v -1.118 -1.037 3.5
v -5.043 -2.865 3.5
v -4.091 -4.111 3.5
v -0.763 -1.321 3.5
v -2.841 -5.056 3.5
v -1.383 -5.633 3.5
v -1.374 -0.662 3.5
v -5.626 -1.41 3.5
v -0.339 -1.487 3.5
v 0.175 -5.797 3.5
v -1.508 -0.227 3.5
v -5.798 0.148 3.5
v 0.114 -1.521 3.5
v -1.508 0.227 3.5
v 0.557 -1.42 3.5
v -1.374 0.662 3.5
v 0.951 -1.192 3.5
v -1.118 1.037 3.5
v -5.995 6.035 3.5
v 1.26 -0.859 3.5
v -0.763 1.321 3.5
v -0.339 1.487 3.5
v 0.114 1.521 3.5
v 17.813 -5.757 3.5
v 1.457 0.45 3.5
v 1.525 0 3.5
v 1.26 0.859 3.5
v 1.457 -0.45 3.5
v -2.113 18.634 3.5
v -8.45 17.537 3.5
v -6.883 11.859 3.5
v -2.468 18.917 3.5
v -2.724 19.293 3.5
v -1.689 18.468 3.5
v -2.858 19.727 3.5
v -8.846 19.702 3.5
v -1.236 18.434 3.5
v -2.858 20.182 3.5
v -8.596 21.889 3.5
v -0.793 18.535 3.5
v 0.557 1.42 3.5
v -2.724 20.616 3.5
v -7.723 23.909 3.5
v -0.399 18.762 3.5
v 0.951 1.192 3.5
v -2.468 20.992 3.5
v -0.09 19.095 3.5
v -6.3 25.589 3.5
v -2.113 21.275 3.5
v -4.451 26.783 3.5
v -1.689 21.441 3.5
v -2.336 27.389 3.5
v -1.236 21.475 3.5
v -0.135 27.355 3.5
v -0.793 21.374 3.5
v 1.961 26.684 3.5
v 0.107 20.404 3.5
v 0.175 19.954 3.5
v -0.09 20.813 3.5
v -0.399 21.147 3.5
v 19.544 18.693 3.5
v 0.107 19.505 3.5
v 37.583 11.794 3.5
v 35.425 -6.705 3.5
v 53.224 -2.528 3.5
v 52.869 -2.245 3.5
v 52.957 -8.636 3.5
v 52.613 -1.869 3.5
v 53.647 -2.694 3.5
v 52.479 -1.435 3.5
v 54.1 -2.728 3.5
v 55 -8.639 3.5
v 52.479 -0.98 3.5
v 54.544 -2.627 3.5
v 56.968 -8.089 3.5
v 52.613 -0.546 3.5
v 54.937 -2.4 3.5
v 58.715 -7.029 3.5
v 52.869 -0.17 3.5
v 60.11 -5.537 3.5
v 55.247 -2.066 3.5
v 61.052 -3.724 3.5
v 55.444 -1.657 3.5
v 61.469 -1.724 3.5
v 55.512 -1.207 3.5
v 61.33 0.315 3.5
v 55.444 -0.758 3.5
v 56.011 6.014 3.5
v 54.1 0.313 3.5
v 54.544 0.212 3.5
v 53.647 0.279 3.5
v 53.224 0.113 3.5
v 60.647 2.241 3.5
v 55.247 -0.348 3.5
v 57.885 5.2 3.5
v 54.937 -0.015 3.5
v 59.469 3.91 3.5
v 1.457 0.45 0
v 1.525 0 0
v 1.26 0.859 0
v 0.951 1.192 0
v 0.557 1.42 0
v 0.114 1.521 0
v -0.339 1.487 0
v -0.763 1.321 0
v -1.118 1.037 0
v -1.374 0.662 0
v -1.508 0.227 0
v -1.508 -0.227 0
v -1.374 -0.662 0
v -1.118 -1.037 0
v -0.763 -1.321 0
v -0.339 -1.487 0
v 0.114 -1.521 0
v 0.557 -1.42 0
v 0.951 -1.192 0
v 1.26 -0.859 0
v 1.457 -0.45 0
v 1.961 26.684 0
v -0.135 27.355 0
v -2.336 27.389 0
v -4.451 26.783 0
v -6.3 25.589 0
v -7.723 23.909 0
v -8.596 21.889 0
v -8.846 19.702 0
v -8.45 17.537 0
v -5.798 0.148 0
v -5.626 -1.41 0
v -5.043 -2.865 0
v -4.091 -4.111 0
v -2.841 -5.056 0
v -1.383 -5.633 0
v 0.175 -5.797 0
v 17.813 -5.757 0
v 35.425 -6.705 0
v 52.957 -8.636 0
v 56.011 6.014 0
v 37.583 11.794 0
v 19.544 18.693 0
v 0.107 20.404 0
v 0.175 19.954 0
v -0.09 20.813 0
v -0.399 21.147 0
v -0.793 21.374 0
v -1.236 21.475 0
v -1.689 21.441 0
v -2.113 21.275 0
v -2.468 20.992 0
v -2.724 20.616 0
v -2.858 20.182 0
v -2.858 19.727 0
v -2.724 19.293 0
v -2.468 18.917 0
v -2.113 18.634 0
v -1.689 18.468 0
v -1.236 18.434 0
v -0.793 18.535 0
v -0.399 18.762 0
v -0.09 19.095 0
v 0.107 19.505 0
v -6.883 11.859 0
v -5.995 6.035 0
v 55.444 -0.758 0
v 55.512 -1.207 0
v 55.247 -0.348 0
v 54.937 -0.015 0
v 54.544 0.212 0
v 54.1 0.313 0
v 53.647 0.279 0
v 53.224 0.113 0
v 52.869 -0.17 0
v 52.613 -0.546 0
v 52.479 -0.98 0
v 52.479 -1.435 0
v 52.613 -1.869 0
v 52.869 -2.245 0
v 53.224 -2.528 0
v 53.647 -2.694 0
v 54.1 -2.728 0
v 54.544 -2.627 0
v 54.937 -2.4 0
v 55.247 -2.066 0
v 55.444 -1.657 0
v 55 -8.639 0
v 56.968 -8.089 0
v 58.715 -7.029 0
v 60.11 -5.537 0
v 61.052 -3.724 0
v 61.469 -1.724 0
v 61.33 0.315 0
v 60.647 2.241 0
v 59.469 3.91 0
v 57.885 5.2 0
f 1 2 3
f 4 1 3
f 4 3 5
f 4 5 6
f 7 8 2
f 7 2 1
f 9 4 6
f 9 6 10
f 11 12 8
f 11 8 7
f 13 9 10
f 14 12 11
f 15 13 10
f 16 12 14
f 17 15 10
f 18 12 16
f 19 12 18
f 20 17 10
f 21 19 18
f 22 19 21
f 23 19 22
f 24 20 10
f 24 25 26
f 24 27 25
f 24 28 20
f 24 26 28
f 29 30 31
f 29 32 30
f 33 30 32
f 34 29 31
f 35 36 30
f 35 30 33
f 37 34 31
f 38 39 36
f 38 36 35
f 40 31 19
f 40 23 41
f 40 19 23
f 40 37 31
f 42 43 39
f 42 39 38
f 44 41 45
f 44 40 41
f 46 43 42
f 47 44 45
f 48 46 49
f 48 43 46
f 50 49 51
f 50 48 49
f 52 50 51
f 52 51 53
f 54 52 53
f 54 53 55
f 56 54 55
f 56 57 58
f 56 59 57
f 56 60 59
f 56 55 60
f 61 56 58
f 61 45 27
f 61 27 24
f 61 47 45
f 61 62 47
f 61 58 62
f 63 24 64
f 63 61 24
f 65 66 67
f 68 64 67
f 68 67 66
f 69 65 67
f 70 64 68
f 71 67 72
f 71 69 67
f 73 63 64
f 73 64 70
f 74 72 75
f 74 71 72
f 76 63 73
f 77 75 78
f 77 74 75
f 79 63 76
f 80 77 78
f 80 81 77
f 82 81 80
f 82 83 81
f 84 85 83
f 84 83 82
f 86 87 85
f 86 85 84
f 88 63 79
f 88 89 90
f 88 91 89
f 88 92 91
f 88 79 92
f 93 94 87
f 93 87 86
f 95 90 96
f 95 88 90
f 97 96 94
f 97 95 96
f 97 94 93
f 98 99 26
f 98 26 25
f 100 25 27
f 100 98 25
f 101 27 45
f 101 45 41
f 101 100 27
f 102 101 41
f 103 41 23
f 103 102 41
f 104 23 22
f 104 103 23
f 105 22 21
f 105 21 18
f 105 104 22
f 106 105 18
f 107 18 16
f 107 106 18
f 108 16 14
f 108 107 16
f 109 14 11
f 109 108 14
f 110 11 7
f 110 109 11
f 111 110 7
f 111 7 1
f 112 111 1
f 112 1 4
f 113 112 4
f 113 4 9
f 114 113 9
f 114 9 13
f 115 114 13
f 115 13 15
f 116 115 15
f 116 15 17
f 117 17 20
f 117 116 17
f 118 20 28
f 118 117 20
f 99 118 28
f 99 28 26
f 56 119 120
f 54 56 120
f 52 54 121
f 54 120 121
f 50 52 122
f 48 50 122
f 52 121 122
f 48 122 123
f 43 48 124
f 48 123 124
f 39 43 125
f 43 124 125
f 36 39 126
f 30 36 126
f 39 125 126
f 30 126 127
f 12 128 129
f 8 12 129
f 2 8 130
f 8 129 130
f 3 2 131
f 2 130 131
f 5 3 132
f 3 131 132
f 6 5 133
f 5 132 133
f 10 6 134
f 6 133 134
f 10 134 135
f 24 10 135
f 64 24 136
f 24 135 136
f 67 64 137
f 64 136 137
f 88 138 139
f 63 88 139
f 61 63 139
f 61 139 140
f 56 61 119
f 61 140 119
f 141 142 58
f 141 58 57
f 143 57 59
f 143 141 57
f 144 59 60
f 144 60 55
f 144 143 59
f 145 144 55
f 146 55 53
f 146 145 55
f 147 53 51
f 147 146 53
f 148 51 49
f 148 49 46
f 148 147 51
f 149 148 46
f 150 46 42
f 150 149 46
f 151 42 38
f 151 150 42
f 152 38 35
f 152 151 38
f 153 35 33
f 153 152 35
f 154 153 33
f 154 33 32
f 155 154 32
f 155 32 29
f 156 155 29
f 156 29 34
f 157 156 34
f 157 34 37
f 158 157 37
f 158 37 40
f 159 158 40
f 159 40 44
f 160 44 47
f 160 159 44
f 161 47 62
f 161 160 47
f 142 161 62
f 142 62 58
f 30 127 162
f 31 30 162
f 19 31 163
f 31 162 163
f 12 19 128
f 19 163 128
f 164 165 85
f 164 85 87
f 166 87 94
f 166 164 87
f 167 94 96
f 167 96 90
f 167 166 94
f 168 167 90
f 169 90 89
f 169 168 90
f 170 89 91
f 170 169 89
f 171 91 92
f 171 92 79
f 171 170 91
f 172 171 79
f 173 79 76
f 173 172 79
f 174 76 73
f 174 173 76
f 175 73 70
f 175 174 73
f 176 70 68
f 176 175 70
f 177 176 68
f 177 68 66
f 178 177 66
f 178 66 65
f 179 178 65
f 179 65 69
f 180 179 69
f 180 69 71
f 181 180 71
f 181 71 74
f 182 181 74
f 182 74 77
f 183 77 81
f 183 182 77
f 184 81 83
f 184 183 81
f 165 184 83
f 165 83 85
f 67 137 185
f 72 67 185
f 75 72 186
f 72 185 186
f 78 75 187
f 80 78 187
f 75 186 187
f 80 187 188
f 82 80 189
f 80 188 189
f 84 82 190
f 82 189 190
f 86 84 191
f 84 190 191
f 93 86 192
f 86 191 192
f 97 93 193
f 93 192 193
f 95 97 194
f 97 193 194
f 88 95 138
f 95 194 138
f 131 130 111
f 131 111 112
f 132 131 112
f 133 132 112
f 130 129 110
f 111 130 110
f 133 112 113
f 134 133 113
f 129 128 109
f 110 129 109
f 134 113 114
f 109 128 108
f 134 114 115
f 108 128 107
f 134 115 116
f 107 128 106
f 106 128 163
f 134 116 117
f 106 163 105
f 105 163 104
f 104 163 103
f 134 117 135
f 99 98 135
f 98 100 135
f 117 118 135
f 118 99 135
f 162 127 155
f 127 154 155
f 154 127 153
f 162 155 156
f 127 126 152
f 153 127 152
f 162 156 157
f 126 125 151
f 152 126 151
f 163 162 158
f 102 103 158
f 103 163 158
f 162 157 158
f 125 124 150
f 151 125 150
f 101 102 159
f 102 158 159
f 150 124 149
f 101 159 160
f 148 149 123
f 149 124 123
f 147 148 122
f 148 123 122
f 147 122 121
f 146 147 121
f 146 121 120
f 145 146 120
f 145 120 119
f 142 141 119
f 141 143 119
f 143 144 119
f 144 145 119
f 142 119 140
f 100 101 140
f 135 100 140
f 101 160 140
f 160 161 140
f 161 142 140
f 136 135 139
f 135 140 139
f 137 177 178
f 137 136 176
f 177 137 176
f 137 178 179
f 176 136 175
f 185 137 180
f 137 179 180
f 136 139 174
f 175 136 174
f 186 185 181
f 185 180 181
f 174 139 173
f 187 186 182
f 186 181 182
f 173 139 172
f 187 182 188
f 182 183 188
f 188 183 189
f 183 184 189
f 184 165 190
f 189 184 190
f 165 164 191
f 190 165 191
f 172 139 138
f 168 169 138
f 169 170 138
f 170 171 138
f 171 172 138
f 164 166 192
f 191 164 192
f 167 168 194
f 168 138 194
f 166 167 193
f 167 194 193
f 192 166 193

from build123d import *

# Parameters (mm, degrees)
SKETCH1_R           = 1.525
BOSS_EXTRUDE1_DEPTH = 3.5


with BuildPart() as part:
    # Sketch1 → Boss-Extrude1 (new body)
    with BuildSketch(Plane.XY):
        with BuildLine():
            ThreePointArc((-5.798114447, 0.147881218), (-4.091440025, -4.110975374), (0.175497637, -5.79734427))
            ThreePointArc((0.175497637, -5.79734427), (26.625773358, -6.107804645), (52.956740344, -8.636371224))
            ThreePointArc((52.956740344, -8.636371224), (61.328682163, -2.737878642), (56.01066855, 6.014284277))
            ThreePointArc((56.01066855, 6.014284277), (28.510221344, 15.105334328), (1.961063899, 26.683936423))
            ThreePointArc((1.961063899, 26.683936423), (-6.300180669, 25.588718748), (-8.449807785, 17.537211633))
            ThreePointArc((-8.449807785, 17.537211633), (-6.353241495, 8.96007321), (-5.798114447, 0.147881218))
        make_face()
        with Locations((-1.35, 19.954385483)):
            Circle(SKETCH1_R, mode=Mode.SUBTRACT)
        Circle(SKETCH1_R, mode=Mode.SUBTRACT)
        with Locations((53.9865, -1.207401238)):
            Circle(SKETCH1_R, mode=Mode.SUBTRACT)
    extrude(amount=BOSS_EXTRUDE1_DEPTH)


solid = part.part
